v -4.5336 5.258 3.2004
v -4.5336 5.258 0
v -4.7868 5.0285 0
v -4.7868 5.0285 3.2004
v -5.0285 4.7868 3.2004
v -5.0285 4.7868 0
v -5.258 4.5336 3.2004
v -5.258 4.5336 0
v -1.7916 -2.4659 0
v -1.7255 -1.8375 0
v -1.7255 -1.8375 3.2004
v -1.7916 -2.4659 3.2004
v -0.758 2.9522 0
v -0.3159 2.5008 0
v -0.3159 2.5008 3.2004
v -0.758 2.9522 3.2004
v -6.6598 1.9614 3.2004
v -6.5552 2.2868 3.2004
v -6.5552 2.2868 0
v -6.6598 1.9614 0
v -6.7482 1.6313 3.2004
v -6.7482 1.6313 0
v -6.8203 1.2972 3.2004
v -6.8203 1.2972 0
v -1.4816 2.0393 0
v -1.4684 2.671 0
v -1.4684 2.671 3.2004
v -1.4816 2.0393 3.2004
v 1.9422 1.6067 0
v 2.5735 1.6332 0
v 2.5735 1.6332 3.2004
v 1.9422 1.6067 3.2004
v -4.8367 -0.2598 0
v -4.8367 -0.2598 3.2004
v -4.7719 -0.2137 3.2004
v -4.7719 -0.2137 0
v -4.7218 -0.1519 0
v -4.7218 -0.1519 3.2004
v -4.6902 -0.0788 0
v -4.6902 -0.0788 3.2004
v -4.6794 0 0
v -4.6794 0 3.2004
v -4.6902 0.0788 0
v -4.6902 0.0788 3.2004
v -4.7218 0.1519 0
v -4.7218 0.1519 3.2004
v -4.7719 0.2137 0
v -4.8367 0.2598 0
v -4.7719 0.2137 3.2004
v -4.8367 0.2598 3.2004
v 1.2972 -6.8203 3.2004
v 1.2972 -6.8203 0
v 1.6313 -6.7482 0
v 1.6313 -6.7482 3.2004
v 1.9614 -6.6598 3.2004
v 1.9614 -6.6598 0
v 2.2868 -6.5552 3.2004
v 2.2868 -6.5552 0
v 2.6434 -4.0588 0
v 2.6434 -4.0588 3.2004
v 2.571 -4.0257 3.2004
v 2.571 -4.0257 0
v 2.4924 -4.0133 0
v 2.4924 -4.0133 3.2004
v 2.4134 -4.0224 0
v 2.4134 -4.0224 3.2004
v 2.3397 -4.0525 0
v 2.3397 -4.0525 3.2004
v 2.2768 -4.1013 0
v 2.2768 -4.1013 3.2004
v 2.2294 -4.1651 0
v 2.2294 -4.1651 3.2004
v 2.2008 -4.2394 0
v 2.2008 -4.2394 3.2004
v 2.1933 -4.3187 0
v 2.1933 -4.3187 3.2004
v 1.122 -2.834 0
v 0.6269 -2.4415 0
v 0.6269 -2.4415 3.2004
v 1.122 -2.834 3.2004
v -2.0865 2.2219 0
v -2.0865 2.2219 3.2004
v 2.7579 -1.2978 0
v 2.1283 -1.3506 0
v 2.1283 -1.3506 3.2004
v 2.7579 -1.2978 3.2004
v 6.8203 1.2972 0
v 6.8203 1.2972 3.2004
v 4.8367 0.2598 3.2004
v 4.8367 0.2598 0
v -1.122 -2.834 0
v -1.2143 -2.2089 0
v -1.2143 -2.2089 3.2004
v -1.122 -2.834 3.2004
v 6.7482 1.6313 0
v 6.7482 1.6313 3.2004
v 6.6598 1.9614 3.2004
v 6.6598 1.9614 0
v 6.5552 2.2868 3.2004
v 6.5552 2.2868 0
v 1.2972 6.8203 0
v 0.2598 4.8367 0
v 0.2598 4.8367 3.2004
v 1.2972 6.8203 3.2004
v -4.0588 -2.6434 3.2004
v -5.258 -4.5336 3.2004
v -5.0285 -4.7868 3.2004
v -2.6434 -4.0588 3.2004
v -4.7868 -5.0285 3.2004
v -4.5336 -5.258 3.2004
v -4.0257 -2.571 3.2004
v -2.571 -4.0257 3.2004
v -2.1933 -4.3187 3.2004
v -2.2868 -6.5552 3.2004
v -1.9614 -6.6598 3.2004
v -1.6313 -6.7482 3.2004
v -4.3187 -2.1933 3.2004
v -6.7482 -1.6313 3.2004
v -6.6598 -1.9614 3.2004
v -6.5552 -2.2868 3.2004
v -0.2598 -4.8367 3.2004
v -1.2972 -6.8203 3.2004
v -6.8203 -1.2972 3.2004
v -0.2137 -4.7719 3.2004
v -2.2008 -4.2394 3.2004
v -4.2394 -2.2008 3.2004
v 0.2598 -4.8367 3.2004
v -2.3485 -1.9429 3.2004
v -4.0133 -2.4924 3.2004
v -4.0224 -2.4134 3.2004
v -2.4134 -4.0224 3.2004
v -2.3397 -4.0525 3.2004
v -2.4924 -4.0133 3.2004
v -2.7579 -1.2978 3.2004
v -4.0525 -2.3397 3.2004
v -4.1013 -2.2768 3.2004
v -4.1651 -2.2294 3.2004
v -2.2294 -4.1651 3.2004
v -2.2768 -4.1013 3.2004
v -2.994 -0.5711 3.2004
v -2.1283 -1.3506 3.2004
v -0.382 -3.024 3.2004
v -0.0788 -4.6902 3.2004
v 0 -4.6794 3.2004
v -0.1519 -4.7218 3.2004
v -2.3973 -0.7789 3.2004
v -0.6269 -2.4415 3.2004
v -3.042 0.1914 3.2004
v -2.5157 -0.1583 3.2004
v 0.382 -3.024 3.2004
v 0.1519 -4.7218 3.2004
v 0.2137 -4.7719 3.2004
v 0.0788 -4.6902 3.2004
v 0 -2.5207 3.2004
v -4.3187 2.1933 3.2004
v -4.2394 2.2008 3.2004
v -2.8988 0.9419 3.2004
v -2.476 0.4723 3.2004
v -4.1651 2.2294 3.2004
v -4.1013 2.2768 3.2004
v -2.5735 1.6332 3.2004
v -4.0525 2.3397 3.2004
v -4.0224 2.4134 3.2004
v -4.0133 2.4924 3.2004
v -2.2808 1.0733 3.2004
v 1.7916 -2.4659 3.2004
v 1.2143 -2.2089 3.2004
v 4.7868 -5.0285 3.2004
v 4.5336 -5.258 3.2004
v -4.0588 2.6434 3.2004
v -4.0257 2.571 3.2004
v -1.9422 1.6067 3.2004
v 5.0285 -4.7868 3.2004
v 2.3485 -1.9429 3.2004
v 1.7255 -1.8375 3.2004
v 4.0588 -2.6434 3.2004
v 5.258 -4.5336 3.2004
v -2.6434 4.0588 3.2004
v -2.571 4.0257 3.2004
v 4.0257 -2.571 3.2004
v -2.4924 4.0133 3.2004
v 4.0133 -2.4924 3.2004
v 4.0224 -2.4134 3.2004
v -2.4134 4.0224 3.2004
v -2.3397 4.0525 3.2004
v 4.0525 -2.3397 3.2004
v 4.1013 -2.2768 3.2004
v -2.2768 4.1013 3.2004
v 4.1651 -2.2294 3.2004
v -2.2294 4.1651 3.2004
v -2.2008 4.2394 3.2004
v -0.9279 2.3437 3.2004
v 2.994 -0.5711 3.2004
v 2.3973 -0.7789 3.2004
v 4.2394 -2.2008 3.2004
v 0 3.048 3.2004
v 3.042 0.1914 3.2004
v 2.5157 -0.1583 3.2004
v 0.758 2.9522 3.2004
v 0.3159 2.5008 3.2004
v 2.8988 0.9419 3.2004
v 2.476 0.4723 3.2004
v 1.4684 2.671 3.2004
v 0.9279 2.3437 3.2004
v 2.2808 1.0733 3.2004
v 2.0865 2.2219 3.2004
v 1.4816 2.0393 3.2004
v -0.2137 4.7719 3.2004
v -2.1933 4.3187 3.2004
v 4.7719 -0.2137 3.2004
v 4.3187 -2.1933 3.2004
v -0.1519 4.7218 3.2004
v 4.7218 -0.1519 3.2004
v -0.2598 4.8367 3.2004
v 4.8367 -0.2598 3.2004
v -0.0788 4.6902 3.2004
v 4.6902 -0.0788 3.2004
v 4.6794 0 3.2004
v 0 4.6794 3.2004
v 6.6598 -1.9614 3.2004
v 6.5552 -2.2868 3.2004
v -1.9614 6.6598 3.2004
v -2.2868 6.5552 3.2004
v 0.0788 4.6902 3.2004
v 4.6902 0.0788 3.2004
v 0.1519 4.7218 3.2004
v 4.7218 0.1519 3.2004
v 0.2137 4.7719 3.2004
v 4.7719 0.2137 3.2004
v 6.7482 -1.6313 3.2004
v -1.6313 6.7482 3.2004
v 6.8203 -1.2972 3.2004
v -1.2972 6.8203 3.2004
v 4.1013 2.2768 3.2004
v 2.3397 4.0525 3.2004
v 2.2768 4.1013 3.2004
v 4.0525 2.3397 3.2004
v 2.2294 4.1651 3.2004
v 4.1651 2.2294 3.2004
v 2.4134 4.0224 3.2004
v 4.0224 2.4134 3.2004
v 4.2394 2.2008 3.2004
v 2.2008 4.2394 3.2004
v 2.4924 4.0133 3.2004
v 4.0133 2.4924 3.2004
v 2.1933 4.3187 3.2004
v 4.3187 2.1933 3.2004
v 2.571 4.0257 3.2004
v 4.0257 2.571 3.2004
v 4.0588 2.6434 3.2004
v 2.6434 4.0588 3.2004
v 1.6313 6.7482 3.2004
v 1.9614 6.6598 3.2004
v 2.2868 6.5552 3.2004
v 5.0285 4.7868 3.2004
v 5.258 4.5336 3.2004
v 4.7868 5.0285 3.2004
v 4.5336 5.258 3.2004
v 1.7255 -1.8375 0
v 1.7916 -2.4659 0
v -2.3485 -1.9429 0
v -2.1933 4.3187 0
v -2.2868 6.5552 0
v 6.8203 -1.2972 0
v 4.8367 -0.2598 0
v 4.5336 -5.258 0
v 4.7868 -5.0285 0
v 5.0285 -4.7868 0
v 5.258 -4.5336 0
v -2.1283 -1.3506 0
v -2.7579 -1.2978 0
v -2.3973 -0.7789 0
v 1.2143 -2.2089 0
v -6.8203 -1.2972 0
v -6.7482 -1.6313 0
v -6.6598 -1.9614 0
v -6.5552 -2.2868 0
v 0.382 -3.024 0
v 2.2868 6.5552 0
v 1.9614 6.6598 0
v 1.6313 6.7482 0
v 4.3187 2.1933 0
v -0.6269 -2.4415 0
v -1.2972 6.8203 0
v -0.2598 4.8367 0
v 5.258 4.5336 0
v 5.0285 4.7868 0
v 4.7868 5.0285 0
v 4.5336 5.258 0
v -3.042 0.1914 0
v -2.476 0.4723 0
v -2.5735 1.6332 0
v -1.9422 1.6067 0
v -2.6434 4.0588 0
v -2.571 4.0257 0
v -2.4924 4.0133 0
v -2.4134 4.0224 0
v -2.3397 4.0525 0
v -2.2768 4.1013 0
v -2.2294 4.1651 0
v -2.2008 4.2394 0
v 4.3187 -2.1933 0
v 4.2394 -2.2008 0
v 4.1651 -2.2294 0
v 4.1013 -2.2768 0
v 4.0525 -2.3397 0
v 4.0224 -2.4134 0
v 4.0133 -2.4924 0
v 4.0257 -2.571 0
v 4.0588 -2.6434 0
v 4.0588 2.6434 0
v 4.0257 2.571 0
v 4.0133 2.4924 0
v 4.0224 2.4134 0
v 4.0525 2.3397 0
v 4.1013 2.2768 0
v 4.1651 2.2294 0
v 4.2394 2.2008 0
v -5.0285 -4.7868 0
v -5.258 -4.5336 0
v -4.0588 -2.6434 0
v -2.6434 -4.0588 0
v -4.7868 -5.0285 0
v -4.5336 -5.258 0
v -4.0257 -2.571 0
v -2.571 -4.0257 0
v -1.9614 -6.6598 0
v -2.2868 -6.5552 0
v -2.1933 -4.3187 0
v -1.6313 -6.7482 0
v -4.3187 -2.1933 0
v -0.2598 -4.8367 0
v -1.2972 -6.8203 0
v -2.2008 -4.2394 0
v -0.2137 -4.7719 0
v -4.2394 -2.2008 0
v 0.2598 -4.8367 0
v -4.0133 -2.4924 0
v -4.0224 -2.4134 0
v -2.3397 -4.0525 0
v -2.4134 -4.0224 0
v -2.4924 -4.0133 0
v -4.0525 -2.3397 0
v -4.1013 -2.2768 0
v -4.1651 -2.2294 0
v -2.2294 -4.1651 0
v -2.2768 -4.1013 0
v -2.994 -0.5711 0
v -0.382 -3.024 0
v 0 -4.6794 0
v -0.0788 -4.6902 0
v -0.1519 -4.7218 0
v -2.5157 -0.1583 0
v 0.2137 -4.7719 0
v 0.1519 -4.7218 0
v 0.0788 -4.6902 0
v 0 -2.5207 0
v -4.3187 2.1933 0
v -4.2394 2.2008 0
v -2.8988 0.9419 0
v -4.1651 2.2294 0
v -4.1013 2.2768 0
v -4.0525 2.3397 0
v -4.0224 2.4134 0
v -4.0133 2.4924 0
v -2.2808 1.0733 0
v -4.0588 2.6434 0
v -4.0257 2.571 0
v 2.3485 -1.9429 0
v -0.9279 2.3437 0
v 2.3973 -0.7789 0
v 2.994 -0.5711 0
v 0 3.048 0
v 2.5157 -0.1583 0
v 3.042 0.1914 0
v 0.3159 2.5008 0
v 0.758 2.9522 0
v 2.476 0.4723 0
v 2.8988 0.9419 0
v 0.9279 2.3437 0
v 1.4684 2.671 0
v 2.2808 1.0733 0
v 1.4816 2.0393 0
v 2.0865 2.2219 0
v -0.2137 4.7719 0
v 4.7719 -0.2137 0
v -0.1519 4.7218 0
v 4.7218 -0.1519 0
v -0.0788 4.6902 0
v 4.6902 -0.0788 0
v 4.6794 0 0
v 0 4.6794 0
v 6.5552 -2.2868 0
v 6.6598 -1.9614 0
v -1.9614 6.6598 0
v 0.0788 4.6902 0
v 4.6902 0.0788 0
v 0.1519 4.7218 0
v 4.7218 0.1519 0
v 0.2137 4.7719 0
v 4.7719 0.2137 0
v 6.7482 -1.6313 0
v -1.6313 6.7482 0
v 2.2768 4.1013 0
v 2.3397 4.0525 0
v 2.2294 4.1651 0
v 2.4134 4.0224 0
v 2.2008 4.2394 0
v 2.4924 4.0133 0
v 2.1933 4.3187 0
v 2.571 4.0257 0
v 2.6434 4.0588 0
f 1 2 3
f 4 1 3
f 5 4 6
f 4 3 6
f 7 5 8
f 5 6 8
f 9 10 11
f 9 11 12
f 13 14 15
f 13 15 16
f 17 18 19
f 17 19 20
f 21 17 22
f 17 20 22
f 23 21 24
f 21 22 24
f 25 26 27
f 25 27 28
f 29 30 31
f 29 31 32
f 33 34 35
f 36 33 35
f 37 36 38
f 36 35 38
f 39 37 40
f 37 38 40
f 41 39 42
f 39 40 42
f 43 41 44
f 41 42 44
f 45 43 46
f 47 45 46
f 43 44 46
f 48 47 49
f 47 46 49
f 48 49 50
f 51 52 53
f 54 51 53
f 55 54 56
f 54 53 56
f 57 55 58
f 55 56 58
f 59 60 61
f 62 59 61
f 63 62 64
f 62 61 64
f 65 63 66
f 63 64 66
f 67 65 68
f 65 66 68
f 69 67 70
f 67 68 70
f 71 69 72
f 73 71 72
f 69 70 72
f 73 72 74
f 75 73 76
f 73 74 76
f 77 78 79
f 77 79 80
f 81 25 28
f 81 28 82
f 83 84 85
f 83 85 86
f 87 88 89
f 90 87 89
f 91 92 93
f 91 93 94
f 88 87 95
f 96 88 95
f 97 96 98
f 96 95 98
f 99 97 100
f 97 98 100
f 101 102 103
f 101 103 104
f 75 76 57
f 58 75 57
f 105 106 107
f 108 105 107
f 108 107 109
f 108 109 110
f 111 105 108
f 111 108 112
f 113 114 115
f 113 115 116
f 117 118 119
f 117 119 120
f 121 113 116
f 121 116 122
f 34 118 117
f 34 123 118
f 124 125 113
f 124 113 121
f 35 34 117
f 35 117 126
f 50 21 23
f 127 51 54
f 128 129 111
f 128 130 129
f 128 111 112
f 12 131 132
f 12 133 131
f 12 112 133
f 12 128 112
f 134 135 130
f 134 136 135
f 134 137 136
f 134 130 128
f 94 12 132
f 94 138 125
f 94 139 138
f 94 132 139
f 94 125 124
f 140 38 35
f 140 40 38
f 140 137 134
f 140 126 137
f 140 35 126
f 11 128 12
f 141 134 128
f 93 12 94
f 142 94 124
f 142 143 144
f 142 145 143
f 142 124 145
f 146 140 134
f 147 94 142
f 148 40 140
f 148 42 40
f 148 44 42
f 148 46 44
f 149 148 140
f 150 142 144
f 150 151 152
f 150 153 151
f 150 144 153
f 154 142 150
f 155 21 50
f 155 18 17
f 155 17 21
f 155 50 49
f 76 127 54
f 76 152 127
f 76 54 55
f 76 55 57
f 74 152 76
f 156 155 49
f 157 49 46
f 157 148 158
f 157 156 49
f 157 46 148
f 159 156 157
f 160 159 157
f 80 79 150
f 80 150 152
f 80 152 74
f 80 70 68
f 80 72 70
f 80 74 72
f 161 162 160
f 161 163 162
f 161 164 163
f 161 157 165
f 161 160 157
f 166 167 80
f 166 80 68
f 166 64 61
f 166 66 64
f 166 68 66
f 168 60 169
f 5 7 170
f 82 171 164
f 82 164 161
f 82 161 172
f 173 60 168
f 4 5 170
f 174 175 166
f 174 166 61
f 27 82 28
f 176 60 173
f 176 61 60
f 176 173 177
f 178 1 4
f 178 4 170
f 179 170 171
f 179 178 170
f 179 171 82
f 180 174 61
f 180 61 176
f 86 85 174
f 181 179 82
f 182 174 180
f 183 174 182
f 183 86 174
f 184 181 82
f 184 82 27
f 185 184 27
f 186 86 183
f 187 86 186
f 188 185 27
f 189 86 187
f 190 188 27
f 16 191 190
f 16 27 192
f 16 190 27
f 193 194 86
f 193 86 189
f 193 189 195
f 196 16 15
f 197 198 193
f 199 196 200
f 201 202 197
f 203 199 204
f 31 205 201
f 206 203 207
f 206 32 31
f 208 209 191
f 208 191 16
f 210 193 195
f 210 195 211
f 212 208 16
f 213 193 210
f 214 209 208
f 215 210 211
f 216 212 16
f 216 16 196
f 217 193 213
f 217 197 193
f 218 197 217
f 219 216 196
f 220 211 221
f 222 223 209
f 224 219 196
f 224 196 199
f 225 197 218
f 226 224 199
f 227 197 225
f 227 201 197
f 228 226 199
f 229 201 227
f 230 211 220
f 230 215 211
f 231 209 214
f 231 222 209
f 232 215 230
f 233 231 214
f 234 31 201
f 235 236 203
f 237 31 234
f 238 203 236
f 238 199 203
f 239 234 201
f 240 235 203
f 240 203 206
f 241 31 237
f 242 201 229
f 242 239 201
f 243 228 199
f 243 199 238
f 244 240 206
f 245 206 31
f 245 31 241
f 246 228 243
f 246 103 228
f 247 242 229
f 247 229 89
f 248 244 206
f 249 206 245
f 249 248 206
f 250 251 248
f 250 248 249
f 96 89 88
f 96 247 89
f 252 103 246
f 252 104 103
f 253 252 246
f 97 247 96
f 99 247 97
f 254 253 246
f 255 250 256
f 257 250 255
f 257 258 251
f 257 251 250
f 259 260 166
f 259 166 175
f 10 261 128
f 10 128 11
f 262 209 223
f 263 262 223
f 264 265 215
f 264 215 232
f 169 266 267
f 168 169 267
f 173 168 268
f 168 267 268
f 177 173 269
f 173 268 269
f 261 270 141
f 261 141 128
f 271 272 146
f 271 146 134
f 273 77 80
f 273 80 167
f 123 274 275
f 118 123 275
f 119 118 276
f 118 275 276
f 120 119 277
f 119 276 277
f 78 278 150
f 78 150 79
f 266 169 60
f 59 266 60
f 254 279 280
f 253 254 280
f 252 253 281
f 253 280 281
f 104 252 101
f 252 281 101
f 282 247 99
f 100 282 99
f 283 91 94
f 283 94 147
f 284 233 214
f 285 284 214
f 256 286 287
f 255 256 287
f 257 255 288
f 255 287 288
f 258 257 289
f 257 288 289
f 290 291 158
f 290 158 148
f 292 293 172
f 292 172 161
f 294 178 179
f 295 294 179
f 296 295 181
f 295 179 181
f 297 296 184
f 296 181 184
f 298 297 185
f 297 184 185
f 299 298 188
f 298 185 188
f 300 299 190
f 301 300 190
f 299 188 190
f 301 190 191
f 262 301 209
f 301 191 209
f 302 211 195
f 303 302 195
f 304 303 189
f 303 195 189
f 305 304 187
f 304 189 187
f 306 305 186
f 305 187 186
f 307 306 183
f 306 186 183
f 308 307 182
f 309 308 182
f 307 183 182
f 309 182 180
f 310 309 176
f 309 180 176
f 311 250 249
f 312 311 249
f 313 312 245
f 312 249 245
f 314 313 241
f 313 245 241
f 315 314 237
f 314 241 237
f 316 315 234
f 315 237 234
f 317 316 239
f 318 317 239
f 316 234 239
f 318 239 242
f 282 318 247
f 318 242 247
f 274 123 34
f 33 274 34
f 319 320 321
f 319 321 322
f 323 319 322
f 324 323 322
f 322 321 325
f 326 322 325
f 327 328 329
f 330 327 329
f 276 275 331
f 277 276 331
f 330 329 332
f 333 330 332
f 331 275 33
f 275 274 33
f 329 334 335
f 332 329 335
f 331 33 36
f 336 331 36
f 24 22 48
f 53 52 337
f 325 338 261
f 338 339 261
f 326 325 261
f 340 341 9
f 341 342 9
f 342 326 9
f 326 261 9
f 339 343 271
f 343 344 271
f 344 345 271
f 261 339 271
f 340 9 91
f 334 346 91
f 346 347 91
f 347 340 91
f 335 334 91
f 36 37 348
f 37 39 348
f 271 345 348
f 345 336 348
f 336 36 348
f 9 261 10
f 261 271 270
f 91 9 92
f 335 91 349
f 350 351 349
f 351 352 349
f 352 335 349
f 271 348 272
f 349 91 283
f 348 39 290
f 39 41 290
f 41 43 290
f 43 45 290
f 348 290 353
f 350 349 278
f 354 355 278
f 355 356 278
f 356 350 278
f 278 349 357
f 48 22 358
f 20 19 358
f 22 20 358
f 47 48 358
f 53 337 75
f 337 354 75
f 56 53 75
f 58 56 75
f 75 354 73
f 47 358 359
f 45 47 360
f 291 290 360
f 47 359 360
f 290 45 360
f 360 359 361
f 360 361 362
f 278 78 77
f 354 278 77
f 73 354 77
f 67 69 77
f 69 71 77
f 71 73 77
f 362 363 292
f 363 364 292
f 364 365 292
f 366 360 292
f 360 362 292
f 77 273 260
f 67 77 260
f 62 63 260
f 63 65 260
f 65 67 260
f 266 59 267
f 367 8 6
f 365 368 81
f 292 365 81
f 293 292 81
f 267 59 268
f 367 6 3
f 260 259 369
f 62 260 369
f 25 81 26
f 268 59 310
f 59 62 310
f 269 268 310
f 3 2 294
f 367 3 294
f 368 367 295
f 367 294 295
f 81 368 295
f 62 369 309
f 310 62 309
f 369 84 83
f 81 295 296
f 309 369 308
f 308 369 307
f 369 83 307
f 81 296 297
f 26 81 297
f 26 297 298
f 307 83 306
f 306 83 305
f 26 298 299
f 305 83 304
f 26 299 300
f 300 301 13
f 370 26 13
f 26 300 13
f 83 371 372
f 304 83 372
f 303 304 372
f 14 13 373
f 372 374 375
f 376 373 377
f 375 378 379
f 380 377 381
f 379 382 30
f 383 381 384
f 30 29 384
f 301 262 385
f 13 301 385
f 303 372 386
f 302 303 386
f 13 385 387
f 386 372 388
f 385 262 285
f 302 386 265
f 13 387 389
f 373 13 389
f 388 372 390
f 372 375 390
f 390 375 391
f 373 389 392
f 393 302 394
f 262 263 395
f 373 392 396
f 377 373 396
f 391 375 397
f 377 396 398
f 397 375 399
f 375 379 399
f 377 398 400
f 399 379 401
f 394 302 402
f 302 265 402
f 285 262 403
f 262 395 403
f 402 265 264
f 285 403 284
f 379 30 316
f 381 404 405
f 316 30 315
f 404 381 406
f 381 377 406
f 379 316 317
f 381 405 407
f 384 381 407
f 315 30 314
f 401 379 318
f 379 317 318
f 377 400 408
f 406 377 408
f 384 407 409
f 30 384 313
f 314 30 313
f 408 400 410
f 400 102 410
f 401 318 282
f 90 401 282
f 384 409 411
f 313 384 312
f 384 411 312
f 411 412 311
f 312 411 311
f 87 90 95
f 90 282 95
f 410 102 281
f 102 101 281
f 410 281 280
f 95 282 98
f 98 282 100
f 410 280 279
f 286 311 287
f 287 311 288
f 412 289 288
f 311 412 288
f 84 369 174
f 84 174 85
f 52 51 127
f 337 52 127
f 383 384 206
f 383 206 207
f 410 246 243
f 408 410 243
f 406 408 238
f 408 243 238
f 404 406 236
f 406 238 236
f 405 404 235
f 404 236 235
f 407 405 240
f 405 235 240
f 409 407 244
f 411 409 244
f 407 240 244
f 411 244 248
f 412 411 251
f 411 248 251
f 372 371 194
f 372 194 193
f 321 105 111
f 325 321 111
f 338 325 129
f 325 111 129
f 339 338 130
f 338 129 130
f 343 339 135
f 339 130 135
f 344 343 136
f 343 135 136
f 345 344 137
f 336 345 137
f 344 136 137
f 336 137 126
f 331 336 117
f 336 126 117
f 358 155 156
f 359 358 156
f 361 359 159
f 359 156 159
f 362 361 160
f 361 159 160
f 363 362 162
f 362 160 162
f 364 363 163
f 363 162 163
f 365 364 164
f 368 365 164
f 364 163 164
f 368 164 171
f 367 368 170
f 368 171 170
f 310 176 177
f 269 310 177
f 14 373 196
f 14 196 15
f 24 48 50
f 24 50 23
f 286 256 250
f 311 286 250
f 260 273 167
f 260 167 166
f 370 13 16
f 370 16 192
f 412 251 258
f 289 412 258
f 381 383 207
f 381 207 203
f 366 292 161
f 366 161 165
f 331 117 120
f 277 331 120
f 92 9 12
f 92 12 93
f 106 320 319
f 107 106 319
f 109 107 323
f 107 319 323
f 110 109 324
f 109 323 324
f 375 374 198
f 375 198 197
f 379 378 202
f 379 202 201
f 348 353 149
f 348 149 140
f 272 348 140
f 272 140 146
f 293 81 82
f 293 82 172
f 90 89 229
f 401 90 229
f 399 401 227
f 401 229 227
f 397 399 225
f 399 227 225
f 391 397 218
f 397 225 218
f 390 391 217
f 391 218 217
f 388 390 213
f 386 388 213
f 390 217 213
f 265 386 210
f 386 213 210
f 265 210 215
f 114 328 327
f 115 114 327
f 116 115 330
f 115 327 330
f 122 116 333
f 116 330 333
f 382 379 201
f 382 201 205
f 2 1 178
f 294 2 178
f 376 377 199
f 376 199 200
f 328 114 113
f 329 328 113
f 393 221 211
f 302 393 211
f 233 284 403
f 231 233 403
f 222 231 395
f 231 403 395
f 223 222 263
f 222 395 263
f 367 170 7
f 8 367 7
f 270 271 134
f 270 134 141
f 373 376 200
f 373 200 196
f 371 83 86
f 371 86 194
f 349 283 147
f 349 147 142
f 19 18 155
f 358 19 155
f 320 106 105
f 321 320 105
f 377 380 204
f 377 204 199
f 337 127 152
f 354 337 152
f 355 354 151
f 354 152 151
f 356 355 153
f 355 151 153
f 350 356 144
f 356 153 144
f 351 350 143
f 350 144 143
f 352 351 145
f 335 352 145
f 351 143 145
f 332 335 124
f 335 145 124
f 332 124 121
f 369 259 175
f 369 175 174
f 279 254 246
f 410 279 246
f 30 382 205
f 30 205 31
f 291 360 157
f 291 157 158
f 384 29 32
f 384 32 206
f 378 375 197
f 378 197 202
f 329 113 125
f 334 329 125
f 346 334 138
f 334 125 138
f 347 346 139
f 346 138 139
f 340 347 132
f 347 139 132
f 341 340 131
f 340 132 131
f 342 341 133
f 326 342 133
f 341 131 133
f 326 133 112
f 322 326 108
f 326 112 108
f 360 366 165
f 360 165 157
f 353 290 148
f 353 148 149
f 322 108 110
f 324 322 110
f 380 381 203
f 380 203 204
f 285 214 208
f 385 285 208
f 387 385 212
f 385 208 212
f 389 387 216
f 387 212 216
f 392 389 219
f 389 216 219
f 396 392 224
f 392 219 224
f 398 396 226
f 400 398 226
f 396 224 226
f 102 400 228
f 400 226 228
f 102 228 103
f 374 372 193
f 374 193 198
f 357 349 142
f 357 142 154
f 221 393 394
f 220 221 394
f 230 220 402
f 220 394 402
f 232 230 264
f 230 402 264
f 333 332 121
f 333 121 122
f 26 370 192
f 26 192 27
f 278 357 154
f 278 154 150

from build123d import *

# Parameters (mm, degrees)
SKETCH1_R           = 6.942600547
BOSS_EXTRUDE1_DEPTH = 3.2004
CUT_EXTRUDE1_DEPTH  = 3.2004


with BuildPart() as part:
    # Sketch1 → Boss-Extrude1 (new body)
    with BuildSketch(Plane.XY):
        Circle(SKETCH1_R)
        Polygon((0, 3.048), (-0.315924789, 2.500802214), (-0.758006776, 2.952241475), (-0.927923651, 2.343667613), (-1.468385199, 2.670982761), (-1.481617658, 2.039271757), (-2.086499579, 2.221896376), (-1.942216178, 1.606740957), (-2.573511517, 1.633200071), (-2.280778112, 1.073252713), (-2.898820262, 0.941883799), (-2.47603037, 0.472328054), (-3.041985468, 0.191385504), (-2.515704533, -0.158274714), (-2.99401154, -0.571138247), (-2.397307729, -0.778932499), (-2.757912856, -1.297775281), (-2.128279263, -1.350647091), (-2.348524364, -1.942868321), (-1.725523184, -1.837495558), (-1.791569449, -2.465883799), (-1.214346137, -2.208887422), (-1.122043637, -2.833958729), (-0.626867256, -2.441486766), (-0.382015696, -3.02396561), (0, -2.520678517), (0.382015696, -3.02396561), (0.626867256, -2.441486766), (1.122043637, -2.833958729), (1.214346137, -2.208887422), (1.791569449, -2.465883799), (1.725523184, -1.837495558), (2.348524364, -1.942868321), (2.128279263, -1.350647091), (2.757912856, -1.297775281), (2.397307729, -0.778932499), (2.99401154, -0.571138247), (2.515704533, -0.158274714), (3.041985468, 0.191385504), (2.47603037, 0.472328054), (2.898820262, 0.941883799), (2.280778112, 1.073252713), (2.573511517, 1.633200071), (1.942216178, 1.606740957), (2.086499579, 2.221896376), (1.481617658, 2.039271757), (1.468385199, 2.670982761), (0.927923651, 2.343667613), (0.758006776, 2.952241475), (0.315924789, 2.500802214), align=None, mode=Mode.SUBTRACT)
    extrude(amount=BOSS_EXTRUDE1_DEPTH)

    # Sketch2 → Cut-Extrude1 (cut)
    with BuildSketch(Plane.XY.offset(3.2004)):
        with BuildLine():
            Line((-1.297184474, 6.820338319), (-0.259835526, 4.836738163))
            ThreePointArc((-0.259835526, 4.836738163), (0, 4.679400627), (0.259835526, 4.836738163))
            Line((0.259835526, 4.836738163), (1.297184474, 6.820338319))
            ThreePointArc((1.297184474, 6.820338319), (0, 6.942600547), (-1.297184474, 6.820338319))
        make_face()
        with BuildLine():
            Line((2.643393248, 4.058820358), (4.533563867, 5.25799401))
            ThreePointArc((4.533563867, 5.25799401), (3.471300273, 6.012468442), (2.286774452, 6.555178484))
            Line((2.286774452, 6.555178484), (2.193344915, 4.318655884))
            ThreePointArc((2.193344915, 4.318655884), (2.339700314, 4.052479818), (2.643393248, 4.058820358))
        make_face()
        with BuildLine():
            Line((4.318655884, 2.193344915), (6.555178484, 2.286774452))
            ThreePointArc((6.555178484, 2.286774452), (6.012468442, 3.471300273), (5.25799401, 4.533563867))
            Line((5.25799401, 4.533563867), (4.058820358, 2.643393248))
            ThreePointArc((4.058820358, 2.643393248), (4.052479818, 2.339700314), (4.318655884, 2.193344915))
        make_face()
        with BuildLine():
            Line((4.836738163, -0.259835526), (6.820338319, -1.297184474))
            ThreePointArc((6.820338319, -1.297184474), (6.942600547, 0), (6.820338319, 1.297184474))
            Line((6.820338319, 1.297184474), (4.836738163, 0.259835526))
            ThreePointArc((4.836738163, 0.259835526), (4.679400627, 0), (4.836738163, -0.259835526))
        make_face()
        with BuildLine():
            Line((4.058820358, -2.643393248), (5.25799401, -4.533563867))
            ThreePointArc((5.25799401, -4.533563867), (6.012468442, -3.471300273), (6.555178484, -2.286774452))
            Line((6.555178484, -2.286774452), (4.318655884, -2.193344915))
            ThreePointArc((4.318655884, -2.193344915), (4.052479818, -2.339700314), (4.058820358, -2.643393248))
        make_face()
        with BuildLine():
            Line((2.193344915, -4.318655884), (2.286774452, -6.555178484))
            ThreePointArc((2.286774452, -6.555178484), (3.471300273, -6.012468442), (4.533563867, -5.25799401))
            Line((4.533563867, -5.25799401), (2.643393248, -4.058820358))
            ThreePointArc((2.643393248, -4.058820358), (2.339700314, -4.052479818), (2.193344915, -4.318655884))
        make_face()
        with BuildLine():
            Line((-0.259835526, -4.836738163), (-1.297184474, -6.820338319))
            ThreePointArc((-1.297184474, -6.820338319), (0, -6.942600547), (1.297184474, -6.820338319))
            Line((1.297184474, -6.820338319), (0.259835526, -4.836738163))
            ThreePointArc((0.259835526, -4.836738163), (0, -4.679400627), (-0.259835526, -4.836738163))
        make_face()
        with BuildLine():
            Line((-2.643393248, -4.058820358), (-4.533563867, -5.25799401))
            ThreePointArc((-4.533563867, -5.25799401), (-3.471300273, -6.012468442), (-2.286774452, -6.555178484))
            Line((-2.286774452, -6.555178484), (-2.193344915, -4.318655884))
            ThreePointArc((-2.193344915, -4.318655884), (-2.339700314, -4.052479818), (-2.643393248, -4.058820358))
        make_face()
        with BuildLine():
            Line((-4.318655884, -2.193344915), (-6.555178484, -2.286774452))
            ThreePointArc((-6.555178484, -2.286774452), (-6.012468442, -3.471300273), (-5.25799401, -4.533563867))
            Line((-5.25799401, -4.533563867), (-4.058820358, -2.643393248))
            ThreePointArc((-4.058820358, -2.643393248), (-4.052479818, -2.339700314), (-4.318655884, -2.193344915))
        make_face()
        with BuildLine():
            Line((-4.836738163, 0.259835526), (-6.820338319, 1.297184474))
            ThreePointArc((-6.820338319, 1.297184474), (-6.942600547, 0), (-6.820338319, -1.297184474))
            Line((-6.820338319, -1.297184474), (-4.836738163, -0.259835526))
            ThreePointArc((-4.836738163, -0.259835526), (-4.679400627, 0), (-4.836738163, 0.259835526))
        make_face()
        with BuildLine():
            Line((-4.058820358, 2.643393248), (-5.25799401, 4.533563867))
            ThreePointArc((-5.25799401, 4.533563867), (-6.012468442, 3.471300273), (-6.555178484, 2.286774452))
            Line((-6.555178484, 2.286774452), (-4.318655884, 2.193344915))
            ThreePointArc((-4.318655884, 2.193344915), (-4.052479818, 2.339700314), (-4.058820358, 2.643393248))
        make_face()
        with BuildLine():
            Line((-2.193344915, 4.318655884), (-2.286774452, 6.555178484))
            ThreePointArc((-2.286774452, 6.555178484), (-3.471300273, 6.012468442), (-4.533563867, 5.25799401))
            Line((-4.533563867, 5.25799401), (-2.643393248, 4.058820358))
            ThreePointArc((-2.643393248, 4.058820358), (-2.339700314, 4.052479818), (-2.193344915, 4.318655884))
        make_face()
    extrude(amount=-CUT_EXTRUDE1_DEPTH, mode=Mode.SUBTRACT)


solid = part.part
